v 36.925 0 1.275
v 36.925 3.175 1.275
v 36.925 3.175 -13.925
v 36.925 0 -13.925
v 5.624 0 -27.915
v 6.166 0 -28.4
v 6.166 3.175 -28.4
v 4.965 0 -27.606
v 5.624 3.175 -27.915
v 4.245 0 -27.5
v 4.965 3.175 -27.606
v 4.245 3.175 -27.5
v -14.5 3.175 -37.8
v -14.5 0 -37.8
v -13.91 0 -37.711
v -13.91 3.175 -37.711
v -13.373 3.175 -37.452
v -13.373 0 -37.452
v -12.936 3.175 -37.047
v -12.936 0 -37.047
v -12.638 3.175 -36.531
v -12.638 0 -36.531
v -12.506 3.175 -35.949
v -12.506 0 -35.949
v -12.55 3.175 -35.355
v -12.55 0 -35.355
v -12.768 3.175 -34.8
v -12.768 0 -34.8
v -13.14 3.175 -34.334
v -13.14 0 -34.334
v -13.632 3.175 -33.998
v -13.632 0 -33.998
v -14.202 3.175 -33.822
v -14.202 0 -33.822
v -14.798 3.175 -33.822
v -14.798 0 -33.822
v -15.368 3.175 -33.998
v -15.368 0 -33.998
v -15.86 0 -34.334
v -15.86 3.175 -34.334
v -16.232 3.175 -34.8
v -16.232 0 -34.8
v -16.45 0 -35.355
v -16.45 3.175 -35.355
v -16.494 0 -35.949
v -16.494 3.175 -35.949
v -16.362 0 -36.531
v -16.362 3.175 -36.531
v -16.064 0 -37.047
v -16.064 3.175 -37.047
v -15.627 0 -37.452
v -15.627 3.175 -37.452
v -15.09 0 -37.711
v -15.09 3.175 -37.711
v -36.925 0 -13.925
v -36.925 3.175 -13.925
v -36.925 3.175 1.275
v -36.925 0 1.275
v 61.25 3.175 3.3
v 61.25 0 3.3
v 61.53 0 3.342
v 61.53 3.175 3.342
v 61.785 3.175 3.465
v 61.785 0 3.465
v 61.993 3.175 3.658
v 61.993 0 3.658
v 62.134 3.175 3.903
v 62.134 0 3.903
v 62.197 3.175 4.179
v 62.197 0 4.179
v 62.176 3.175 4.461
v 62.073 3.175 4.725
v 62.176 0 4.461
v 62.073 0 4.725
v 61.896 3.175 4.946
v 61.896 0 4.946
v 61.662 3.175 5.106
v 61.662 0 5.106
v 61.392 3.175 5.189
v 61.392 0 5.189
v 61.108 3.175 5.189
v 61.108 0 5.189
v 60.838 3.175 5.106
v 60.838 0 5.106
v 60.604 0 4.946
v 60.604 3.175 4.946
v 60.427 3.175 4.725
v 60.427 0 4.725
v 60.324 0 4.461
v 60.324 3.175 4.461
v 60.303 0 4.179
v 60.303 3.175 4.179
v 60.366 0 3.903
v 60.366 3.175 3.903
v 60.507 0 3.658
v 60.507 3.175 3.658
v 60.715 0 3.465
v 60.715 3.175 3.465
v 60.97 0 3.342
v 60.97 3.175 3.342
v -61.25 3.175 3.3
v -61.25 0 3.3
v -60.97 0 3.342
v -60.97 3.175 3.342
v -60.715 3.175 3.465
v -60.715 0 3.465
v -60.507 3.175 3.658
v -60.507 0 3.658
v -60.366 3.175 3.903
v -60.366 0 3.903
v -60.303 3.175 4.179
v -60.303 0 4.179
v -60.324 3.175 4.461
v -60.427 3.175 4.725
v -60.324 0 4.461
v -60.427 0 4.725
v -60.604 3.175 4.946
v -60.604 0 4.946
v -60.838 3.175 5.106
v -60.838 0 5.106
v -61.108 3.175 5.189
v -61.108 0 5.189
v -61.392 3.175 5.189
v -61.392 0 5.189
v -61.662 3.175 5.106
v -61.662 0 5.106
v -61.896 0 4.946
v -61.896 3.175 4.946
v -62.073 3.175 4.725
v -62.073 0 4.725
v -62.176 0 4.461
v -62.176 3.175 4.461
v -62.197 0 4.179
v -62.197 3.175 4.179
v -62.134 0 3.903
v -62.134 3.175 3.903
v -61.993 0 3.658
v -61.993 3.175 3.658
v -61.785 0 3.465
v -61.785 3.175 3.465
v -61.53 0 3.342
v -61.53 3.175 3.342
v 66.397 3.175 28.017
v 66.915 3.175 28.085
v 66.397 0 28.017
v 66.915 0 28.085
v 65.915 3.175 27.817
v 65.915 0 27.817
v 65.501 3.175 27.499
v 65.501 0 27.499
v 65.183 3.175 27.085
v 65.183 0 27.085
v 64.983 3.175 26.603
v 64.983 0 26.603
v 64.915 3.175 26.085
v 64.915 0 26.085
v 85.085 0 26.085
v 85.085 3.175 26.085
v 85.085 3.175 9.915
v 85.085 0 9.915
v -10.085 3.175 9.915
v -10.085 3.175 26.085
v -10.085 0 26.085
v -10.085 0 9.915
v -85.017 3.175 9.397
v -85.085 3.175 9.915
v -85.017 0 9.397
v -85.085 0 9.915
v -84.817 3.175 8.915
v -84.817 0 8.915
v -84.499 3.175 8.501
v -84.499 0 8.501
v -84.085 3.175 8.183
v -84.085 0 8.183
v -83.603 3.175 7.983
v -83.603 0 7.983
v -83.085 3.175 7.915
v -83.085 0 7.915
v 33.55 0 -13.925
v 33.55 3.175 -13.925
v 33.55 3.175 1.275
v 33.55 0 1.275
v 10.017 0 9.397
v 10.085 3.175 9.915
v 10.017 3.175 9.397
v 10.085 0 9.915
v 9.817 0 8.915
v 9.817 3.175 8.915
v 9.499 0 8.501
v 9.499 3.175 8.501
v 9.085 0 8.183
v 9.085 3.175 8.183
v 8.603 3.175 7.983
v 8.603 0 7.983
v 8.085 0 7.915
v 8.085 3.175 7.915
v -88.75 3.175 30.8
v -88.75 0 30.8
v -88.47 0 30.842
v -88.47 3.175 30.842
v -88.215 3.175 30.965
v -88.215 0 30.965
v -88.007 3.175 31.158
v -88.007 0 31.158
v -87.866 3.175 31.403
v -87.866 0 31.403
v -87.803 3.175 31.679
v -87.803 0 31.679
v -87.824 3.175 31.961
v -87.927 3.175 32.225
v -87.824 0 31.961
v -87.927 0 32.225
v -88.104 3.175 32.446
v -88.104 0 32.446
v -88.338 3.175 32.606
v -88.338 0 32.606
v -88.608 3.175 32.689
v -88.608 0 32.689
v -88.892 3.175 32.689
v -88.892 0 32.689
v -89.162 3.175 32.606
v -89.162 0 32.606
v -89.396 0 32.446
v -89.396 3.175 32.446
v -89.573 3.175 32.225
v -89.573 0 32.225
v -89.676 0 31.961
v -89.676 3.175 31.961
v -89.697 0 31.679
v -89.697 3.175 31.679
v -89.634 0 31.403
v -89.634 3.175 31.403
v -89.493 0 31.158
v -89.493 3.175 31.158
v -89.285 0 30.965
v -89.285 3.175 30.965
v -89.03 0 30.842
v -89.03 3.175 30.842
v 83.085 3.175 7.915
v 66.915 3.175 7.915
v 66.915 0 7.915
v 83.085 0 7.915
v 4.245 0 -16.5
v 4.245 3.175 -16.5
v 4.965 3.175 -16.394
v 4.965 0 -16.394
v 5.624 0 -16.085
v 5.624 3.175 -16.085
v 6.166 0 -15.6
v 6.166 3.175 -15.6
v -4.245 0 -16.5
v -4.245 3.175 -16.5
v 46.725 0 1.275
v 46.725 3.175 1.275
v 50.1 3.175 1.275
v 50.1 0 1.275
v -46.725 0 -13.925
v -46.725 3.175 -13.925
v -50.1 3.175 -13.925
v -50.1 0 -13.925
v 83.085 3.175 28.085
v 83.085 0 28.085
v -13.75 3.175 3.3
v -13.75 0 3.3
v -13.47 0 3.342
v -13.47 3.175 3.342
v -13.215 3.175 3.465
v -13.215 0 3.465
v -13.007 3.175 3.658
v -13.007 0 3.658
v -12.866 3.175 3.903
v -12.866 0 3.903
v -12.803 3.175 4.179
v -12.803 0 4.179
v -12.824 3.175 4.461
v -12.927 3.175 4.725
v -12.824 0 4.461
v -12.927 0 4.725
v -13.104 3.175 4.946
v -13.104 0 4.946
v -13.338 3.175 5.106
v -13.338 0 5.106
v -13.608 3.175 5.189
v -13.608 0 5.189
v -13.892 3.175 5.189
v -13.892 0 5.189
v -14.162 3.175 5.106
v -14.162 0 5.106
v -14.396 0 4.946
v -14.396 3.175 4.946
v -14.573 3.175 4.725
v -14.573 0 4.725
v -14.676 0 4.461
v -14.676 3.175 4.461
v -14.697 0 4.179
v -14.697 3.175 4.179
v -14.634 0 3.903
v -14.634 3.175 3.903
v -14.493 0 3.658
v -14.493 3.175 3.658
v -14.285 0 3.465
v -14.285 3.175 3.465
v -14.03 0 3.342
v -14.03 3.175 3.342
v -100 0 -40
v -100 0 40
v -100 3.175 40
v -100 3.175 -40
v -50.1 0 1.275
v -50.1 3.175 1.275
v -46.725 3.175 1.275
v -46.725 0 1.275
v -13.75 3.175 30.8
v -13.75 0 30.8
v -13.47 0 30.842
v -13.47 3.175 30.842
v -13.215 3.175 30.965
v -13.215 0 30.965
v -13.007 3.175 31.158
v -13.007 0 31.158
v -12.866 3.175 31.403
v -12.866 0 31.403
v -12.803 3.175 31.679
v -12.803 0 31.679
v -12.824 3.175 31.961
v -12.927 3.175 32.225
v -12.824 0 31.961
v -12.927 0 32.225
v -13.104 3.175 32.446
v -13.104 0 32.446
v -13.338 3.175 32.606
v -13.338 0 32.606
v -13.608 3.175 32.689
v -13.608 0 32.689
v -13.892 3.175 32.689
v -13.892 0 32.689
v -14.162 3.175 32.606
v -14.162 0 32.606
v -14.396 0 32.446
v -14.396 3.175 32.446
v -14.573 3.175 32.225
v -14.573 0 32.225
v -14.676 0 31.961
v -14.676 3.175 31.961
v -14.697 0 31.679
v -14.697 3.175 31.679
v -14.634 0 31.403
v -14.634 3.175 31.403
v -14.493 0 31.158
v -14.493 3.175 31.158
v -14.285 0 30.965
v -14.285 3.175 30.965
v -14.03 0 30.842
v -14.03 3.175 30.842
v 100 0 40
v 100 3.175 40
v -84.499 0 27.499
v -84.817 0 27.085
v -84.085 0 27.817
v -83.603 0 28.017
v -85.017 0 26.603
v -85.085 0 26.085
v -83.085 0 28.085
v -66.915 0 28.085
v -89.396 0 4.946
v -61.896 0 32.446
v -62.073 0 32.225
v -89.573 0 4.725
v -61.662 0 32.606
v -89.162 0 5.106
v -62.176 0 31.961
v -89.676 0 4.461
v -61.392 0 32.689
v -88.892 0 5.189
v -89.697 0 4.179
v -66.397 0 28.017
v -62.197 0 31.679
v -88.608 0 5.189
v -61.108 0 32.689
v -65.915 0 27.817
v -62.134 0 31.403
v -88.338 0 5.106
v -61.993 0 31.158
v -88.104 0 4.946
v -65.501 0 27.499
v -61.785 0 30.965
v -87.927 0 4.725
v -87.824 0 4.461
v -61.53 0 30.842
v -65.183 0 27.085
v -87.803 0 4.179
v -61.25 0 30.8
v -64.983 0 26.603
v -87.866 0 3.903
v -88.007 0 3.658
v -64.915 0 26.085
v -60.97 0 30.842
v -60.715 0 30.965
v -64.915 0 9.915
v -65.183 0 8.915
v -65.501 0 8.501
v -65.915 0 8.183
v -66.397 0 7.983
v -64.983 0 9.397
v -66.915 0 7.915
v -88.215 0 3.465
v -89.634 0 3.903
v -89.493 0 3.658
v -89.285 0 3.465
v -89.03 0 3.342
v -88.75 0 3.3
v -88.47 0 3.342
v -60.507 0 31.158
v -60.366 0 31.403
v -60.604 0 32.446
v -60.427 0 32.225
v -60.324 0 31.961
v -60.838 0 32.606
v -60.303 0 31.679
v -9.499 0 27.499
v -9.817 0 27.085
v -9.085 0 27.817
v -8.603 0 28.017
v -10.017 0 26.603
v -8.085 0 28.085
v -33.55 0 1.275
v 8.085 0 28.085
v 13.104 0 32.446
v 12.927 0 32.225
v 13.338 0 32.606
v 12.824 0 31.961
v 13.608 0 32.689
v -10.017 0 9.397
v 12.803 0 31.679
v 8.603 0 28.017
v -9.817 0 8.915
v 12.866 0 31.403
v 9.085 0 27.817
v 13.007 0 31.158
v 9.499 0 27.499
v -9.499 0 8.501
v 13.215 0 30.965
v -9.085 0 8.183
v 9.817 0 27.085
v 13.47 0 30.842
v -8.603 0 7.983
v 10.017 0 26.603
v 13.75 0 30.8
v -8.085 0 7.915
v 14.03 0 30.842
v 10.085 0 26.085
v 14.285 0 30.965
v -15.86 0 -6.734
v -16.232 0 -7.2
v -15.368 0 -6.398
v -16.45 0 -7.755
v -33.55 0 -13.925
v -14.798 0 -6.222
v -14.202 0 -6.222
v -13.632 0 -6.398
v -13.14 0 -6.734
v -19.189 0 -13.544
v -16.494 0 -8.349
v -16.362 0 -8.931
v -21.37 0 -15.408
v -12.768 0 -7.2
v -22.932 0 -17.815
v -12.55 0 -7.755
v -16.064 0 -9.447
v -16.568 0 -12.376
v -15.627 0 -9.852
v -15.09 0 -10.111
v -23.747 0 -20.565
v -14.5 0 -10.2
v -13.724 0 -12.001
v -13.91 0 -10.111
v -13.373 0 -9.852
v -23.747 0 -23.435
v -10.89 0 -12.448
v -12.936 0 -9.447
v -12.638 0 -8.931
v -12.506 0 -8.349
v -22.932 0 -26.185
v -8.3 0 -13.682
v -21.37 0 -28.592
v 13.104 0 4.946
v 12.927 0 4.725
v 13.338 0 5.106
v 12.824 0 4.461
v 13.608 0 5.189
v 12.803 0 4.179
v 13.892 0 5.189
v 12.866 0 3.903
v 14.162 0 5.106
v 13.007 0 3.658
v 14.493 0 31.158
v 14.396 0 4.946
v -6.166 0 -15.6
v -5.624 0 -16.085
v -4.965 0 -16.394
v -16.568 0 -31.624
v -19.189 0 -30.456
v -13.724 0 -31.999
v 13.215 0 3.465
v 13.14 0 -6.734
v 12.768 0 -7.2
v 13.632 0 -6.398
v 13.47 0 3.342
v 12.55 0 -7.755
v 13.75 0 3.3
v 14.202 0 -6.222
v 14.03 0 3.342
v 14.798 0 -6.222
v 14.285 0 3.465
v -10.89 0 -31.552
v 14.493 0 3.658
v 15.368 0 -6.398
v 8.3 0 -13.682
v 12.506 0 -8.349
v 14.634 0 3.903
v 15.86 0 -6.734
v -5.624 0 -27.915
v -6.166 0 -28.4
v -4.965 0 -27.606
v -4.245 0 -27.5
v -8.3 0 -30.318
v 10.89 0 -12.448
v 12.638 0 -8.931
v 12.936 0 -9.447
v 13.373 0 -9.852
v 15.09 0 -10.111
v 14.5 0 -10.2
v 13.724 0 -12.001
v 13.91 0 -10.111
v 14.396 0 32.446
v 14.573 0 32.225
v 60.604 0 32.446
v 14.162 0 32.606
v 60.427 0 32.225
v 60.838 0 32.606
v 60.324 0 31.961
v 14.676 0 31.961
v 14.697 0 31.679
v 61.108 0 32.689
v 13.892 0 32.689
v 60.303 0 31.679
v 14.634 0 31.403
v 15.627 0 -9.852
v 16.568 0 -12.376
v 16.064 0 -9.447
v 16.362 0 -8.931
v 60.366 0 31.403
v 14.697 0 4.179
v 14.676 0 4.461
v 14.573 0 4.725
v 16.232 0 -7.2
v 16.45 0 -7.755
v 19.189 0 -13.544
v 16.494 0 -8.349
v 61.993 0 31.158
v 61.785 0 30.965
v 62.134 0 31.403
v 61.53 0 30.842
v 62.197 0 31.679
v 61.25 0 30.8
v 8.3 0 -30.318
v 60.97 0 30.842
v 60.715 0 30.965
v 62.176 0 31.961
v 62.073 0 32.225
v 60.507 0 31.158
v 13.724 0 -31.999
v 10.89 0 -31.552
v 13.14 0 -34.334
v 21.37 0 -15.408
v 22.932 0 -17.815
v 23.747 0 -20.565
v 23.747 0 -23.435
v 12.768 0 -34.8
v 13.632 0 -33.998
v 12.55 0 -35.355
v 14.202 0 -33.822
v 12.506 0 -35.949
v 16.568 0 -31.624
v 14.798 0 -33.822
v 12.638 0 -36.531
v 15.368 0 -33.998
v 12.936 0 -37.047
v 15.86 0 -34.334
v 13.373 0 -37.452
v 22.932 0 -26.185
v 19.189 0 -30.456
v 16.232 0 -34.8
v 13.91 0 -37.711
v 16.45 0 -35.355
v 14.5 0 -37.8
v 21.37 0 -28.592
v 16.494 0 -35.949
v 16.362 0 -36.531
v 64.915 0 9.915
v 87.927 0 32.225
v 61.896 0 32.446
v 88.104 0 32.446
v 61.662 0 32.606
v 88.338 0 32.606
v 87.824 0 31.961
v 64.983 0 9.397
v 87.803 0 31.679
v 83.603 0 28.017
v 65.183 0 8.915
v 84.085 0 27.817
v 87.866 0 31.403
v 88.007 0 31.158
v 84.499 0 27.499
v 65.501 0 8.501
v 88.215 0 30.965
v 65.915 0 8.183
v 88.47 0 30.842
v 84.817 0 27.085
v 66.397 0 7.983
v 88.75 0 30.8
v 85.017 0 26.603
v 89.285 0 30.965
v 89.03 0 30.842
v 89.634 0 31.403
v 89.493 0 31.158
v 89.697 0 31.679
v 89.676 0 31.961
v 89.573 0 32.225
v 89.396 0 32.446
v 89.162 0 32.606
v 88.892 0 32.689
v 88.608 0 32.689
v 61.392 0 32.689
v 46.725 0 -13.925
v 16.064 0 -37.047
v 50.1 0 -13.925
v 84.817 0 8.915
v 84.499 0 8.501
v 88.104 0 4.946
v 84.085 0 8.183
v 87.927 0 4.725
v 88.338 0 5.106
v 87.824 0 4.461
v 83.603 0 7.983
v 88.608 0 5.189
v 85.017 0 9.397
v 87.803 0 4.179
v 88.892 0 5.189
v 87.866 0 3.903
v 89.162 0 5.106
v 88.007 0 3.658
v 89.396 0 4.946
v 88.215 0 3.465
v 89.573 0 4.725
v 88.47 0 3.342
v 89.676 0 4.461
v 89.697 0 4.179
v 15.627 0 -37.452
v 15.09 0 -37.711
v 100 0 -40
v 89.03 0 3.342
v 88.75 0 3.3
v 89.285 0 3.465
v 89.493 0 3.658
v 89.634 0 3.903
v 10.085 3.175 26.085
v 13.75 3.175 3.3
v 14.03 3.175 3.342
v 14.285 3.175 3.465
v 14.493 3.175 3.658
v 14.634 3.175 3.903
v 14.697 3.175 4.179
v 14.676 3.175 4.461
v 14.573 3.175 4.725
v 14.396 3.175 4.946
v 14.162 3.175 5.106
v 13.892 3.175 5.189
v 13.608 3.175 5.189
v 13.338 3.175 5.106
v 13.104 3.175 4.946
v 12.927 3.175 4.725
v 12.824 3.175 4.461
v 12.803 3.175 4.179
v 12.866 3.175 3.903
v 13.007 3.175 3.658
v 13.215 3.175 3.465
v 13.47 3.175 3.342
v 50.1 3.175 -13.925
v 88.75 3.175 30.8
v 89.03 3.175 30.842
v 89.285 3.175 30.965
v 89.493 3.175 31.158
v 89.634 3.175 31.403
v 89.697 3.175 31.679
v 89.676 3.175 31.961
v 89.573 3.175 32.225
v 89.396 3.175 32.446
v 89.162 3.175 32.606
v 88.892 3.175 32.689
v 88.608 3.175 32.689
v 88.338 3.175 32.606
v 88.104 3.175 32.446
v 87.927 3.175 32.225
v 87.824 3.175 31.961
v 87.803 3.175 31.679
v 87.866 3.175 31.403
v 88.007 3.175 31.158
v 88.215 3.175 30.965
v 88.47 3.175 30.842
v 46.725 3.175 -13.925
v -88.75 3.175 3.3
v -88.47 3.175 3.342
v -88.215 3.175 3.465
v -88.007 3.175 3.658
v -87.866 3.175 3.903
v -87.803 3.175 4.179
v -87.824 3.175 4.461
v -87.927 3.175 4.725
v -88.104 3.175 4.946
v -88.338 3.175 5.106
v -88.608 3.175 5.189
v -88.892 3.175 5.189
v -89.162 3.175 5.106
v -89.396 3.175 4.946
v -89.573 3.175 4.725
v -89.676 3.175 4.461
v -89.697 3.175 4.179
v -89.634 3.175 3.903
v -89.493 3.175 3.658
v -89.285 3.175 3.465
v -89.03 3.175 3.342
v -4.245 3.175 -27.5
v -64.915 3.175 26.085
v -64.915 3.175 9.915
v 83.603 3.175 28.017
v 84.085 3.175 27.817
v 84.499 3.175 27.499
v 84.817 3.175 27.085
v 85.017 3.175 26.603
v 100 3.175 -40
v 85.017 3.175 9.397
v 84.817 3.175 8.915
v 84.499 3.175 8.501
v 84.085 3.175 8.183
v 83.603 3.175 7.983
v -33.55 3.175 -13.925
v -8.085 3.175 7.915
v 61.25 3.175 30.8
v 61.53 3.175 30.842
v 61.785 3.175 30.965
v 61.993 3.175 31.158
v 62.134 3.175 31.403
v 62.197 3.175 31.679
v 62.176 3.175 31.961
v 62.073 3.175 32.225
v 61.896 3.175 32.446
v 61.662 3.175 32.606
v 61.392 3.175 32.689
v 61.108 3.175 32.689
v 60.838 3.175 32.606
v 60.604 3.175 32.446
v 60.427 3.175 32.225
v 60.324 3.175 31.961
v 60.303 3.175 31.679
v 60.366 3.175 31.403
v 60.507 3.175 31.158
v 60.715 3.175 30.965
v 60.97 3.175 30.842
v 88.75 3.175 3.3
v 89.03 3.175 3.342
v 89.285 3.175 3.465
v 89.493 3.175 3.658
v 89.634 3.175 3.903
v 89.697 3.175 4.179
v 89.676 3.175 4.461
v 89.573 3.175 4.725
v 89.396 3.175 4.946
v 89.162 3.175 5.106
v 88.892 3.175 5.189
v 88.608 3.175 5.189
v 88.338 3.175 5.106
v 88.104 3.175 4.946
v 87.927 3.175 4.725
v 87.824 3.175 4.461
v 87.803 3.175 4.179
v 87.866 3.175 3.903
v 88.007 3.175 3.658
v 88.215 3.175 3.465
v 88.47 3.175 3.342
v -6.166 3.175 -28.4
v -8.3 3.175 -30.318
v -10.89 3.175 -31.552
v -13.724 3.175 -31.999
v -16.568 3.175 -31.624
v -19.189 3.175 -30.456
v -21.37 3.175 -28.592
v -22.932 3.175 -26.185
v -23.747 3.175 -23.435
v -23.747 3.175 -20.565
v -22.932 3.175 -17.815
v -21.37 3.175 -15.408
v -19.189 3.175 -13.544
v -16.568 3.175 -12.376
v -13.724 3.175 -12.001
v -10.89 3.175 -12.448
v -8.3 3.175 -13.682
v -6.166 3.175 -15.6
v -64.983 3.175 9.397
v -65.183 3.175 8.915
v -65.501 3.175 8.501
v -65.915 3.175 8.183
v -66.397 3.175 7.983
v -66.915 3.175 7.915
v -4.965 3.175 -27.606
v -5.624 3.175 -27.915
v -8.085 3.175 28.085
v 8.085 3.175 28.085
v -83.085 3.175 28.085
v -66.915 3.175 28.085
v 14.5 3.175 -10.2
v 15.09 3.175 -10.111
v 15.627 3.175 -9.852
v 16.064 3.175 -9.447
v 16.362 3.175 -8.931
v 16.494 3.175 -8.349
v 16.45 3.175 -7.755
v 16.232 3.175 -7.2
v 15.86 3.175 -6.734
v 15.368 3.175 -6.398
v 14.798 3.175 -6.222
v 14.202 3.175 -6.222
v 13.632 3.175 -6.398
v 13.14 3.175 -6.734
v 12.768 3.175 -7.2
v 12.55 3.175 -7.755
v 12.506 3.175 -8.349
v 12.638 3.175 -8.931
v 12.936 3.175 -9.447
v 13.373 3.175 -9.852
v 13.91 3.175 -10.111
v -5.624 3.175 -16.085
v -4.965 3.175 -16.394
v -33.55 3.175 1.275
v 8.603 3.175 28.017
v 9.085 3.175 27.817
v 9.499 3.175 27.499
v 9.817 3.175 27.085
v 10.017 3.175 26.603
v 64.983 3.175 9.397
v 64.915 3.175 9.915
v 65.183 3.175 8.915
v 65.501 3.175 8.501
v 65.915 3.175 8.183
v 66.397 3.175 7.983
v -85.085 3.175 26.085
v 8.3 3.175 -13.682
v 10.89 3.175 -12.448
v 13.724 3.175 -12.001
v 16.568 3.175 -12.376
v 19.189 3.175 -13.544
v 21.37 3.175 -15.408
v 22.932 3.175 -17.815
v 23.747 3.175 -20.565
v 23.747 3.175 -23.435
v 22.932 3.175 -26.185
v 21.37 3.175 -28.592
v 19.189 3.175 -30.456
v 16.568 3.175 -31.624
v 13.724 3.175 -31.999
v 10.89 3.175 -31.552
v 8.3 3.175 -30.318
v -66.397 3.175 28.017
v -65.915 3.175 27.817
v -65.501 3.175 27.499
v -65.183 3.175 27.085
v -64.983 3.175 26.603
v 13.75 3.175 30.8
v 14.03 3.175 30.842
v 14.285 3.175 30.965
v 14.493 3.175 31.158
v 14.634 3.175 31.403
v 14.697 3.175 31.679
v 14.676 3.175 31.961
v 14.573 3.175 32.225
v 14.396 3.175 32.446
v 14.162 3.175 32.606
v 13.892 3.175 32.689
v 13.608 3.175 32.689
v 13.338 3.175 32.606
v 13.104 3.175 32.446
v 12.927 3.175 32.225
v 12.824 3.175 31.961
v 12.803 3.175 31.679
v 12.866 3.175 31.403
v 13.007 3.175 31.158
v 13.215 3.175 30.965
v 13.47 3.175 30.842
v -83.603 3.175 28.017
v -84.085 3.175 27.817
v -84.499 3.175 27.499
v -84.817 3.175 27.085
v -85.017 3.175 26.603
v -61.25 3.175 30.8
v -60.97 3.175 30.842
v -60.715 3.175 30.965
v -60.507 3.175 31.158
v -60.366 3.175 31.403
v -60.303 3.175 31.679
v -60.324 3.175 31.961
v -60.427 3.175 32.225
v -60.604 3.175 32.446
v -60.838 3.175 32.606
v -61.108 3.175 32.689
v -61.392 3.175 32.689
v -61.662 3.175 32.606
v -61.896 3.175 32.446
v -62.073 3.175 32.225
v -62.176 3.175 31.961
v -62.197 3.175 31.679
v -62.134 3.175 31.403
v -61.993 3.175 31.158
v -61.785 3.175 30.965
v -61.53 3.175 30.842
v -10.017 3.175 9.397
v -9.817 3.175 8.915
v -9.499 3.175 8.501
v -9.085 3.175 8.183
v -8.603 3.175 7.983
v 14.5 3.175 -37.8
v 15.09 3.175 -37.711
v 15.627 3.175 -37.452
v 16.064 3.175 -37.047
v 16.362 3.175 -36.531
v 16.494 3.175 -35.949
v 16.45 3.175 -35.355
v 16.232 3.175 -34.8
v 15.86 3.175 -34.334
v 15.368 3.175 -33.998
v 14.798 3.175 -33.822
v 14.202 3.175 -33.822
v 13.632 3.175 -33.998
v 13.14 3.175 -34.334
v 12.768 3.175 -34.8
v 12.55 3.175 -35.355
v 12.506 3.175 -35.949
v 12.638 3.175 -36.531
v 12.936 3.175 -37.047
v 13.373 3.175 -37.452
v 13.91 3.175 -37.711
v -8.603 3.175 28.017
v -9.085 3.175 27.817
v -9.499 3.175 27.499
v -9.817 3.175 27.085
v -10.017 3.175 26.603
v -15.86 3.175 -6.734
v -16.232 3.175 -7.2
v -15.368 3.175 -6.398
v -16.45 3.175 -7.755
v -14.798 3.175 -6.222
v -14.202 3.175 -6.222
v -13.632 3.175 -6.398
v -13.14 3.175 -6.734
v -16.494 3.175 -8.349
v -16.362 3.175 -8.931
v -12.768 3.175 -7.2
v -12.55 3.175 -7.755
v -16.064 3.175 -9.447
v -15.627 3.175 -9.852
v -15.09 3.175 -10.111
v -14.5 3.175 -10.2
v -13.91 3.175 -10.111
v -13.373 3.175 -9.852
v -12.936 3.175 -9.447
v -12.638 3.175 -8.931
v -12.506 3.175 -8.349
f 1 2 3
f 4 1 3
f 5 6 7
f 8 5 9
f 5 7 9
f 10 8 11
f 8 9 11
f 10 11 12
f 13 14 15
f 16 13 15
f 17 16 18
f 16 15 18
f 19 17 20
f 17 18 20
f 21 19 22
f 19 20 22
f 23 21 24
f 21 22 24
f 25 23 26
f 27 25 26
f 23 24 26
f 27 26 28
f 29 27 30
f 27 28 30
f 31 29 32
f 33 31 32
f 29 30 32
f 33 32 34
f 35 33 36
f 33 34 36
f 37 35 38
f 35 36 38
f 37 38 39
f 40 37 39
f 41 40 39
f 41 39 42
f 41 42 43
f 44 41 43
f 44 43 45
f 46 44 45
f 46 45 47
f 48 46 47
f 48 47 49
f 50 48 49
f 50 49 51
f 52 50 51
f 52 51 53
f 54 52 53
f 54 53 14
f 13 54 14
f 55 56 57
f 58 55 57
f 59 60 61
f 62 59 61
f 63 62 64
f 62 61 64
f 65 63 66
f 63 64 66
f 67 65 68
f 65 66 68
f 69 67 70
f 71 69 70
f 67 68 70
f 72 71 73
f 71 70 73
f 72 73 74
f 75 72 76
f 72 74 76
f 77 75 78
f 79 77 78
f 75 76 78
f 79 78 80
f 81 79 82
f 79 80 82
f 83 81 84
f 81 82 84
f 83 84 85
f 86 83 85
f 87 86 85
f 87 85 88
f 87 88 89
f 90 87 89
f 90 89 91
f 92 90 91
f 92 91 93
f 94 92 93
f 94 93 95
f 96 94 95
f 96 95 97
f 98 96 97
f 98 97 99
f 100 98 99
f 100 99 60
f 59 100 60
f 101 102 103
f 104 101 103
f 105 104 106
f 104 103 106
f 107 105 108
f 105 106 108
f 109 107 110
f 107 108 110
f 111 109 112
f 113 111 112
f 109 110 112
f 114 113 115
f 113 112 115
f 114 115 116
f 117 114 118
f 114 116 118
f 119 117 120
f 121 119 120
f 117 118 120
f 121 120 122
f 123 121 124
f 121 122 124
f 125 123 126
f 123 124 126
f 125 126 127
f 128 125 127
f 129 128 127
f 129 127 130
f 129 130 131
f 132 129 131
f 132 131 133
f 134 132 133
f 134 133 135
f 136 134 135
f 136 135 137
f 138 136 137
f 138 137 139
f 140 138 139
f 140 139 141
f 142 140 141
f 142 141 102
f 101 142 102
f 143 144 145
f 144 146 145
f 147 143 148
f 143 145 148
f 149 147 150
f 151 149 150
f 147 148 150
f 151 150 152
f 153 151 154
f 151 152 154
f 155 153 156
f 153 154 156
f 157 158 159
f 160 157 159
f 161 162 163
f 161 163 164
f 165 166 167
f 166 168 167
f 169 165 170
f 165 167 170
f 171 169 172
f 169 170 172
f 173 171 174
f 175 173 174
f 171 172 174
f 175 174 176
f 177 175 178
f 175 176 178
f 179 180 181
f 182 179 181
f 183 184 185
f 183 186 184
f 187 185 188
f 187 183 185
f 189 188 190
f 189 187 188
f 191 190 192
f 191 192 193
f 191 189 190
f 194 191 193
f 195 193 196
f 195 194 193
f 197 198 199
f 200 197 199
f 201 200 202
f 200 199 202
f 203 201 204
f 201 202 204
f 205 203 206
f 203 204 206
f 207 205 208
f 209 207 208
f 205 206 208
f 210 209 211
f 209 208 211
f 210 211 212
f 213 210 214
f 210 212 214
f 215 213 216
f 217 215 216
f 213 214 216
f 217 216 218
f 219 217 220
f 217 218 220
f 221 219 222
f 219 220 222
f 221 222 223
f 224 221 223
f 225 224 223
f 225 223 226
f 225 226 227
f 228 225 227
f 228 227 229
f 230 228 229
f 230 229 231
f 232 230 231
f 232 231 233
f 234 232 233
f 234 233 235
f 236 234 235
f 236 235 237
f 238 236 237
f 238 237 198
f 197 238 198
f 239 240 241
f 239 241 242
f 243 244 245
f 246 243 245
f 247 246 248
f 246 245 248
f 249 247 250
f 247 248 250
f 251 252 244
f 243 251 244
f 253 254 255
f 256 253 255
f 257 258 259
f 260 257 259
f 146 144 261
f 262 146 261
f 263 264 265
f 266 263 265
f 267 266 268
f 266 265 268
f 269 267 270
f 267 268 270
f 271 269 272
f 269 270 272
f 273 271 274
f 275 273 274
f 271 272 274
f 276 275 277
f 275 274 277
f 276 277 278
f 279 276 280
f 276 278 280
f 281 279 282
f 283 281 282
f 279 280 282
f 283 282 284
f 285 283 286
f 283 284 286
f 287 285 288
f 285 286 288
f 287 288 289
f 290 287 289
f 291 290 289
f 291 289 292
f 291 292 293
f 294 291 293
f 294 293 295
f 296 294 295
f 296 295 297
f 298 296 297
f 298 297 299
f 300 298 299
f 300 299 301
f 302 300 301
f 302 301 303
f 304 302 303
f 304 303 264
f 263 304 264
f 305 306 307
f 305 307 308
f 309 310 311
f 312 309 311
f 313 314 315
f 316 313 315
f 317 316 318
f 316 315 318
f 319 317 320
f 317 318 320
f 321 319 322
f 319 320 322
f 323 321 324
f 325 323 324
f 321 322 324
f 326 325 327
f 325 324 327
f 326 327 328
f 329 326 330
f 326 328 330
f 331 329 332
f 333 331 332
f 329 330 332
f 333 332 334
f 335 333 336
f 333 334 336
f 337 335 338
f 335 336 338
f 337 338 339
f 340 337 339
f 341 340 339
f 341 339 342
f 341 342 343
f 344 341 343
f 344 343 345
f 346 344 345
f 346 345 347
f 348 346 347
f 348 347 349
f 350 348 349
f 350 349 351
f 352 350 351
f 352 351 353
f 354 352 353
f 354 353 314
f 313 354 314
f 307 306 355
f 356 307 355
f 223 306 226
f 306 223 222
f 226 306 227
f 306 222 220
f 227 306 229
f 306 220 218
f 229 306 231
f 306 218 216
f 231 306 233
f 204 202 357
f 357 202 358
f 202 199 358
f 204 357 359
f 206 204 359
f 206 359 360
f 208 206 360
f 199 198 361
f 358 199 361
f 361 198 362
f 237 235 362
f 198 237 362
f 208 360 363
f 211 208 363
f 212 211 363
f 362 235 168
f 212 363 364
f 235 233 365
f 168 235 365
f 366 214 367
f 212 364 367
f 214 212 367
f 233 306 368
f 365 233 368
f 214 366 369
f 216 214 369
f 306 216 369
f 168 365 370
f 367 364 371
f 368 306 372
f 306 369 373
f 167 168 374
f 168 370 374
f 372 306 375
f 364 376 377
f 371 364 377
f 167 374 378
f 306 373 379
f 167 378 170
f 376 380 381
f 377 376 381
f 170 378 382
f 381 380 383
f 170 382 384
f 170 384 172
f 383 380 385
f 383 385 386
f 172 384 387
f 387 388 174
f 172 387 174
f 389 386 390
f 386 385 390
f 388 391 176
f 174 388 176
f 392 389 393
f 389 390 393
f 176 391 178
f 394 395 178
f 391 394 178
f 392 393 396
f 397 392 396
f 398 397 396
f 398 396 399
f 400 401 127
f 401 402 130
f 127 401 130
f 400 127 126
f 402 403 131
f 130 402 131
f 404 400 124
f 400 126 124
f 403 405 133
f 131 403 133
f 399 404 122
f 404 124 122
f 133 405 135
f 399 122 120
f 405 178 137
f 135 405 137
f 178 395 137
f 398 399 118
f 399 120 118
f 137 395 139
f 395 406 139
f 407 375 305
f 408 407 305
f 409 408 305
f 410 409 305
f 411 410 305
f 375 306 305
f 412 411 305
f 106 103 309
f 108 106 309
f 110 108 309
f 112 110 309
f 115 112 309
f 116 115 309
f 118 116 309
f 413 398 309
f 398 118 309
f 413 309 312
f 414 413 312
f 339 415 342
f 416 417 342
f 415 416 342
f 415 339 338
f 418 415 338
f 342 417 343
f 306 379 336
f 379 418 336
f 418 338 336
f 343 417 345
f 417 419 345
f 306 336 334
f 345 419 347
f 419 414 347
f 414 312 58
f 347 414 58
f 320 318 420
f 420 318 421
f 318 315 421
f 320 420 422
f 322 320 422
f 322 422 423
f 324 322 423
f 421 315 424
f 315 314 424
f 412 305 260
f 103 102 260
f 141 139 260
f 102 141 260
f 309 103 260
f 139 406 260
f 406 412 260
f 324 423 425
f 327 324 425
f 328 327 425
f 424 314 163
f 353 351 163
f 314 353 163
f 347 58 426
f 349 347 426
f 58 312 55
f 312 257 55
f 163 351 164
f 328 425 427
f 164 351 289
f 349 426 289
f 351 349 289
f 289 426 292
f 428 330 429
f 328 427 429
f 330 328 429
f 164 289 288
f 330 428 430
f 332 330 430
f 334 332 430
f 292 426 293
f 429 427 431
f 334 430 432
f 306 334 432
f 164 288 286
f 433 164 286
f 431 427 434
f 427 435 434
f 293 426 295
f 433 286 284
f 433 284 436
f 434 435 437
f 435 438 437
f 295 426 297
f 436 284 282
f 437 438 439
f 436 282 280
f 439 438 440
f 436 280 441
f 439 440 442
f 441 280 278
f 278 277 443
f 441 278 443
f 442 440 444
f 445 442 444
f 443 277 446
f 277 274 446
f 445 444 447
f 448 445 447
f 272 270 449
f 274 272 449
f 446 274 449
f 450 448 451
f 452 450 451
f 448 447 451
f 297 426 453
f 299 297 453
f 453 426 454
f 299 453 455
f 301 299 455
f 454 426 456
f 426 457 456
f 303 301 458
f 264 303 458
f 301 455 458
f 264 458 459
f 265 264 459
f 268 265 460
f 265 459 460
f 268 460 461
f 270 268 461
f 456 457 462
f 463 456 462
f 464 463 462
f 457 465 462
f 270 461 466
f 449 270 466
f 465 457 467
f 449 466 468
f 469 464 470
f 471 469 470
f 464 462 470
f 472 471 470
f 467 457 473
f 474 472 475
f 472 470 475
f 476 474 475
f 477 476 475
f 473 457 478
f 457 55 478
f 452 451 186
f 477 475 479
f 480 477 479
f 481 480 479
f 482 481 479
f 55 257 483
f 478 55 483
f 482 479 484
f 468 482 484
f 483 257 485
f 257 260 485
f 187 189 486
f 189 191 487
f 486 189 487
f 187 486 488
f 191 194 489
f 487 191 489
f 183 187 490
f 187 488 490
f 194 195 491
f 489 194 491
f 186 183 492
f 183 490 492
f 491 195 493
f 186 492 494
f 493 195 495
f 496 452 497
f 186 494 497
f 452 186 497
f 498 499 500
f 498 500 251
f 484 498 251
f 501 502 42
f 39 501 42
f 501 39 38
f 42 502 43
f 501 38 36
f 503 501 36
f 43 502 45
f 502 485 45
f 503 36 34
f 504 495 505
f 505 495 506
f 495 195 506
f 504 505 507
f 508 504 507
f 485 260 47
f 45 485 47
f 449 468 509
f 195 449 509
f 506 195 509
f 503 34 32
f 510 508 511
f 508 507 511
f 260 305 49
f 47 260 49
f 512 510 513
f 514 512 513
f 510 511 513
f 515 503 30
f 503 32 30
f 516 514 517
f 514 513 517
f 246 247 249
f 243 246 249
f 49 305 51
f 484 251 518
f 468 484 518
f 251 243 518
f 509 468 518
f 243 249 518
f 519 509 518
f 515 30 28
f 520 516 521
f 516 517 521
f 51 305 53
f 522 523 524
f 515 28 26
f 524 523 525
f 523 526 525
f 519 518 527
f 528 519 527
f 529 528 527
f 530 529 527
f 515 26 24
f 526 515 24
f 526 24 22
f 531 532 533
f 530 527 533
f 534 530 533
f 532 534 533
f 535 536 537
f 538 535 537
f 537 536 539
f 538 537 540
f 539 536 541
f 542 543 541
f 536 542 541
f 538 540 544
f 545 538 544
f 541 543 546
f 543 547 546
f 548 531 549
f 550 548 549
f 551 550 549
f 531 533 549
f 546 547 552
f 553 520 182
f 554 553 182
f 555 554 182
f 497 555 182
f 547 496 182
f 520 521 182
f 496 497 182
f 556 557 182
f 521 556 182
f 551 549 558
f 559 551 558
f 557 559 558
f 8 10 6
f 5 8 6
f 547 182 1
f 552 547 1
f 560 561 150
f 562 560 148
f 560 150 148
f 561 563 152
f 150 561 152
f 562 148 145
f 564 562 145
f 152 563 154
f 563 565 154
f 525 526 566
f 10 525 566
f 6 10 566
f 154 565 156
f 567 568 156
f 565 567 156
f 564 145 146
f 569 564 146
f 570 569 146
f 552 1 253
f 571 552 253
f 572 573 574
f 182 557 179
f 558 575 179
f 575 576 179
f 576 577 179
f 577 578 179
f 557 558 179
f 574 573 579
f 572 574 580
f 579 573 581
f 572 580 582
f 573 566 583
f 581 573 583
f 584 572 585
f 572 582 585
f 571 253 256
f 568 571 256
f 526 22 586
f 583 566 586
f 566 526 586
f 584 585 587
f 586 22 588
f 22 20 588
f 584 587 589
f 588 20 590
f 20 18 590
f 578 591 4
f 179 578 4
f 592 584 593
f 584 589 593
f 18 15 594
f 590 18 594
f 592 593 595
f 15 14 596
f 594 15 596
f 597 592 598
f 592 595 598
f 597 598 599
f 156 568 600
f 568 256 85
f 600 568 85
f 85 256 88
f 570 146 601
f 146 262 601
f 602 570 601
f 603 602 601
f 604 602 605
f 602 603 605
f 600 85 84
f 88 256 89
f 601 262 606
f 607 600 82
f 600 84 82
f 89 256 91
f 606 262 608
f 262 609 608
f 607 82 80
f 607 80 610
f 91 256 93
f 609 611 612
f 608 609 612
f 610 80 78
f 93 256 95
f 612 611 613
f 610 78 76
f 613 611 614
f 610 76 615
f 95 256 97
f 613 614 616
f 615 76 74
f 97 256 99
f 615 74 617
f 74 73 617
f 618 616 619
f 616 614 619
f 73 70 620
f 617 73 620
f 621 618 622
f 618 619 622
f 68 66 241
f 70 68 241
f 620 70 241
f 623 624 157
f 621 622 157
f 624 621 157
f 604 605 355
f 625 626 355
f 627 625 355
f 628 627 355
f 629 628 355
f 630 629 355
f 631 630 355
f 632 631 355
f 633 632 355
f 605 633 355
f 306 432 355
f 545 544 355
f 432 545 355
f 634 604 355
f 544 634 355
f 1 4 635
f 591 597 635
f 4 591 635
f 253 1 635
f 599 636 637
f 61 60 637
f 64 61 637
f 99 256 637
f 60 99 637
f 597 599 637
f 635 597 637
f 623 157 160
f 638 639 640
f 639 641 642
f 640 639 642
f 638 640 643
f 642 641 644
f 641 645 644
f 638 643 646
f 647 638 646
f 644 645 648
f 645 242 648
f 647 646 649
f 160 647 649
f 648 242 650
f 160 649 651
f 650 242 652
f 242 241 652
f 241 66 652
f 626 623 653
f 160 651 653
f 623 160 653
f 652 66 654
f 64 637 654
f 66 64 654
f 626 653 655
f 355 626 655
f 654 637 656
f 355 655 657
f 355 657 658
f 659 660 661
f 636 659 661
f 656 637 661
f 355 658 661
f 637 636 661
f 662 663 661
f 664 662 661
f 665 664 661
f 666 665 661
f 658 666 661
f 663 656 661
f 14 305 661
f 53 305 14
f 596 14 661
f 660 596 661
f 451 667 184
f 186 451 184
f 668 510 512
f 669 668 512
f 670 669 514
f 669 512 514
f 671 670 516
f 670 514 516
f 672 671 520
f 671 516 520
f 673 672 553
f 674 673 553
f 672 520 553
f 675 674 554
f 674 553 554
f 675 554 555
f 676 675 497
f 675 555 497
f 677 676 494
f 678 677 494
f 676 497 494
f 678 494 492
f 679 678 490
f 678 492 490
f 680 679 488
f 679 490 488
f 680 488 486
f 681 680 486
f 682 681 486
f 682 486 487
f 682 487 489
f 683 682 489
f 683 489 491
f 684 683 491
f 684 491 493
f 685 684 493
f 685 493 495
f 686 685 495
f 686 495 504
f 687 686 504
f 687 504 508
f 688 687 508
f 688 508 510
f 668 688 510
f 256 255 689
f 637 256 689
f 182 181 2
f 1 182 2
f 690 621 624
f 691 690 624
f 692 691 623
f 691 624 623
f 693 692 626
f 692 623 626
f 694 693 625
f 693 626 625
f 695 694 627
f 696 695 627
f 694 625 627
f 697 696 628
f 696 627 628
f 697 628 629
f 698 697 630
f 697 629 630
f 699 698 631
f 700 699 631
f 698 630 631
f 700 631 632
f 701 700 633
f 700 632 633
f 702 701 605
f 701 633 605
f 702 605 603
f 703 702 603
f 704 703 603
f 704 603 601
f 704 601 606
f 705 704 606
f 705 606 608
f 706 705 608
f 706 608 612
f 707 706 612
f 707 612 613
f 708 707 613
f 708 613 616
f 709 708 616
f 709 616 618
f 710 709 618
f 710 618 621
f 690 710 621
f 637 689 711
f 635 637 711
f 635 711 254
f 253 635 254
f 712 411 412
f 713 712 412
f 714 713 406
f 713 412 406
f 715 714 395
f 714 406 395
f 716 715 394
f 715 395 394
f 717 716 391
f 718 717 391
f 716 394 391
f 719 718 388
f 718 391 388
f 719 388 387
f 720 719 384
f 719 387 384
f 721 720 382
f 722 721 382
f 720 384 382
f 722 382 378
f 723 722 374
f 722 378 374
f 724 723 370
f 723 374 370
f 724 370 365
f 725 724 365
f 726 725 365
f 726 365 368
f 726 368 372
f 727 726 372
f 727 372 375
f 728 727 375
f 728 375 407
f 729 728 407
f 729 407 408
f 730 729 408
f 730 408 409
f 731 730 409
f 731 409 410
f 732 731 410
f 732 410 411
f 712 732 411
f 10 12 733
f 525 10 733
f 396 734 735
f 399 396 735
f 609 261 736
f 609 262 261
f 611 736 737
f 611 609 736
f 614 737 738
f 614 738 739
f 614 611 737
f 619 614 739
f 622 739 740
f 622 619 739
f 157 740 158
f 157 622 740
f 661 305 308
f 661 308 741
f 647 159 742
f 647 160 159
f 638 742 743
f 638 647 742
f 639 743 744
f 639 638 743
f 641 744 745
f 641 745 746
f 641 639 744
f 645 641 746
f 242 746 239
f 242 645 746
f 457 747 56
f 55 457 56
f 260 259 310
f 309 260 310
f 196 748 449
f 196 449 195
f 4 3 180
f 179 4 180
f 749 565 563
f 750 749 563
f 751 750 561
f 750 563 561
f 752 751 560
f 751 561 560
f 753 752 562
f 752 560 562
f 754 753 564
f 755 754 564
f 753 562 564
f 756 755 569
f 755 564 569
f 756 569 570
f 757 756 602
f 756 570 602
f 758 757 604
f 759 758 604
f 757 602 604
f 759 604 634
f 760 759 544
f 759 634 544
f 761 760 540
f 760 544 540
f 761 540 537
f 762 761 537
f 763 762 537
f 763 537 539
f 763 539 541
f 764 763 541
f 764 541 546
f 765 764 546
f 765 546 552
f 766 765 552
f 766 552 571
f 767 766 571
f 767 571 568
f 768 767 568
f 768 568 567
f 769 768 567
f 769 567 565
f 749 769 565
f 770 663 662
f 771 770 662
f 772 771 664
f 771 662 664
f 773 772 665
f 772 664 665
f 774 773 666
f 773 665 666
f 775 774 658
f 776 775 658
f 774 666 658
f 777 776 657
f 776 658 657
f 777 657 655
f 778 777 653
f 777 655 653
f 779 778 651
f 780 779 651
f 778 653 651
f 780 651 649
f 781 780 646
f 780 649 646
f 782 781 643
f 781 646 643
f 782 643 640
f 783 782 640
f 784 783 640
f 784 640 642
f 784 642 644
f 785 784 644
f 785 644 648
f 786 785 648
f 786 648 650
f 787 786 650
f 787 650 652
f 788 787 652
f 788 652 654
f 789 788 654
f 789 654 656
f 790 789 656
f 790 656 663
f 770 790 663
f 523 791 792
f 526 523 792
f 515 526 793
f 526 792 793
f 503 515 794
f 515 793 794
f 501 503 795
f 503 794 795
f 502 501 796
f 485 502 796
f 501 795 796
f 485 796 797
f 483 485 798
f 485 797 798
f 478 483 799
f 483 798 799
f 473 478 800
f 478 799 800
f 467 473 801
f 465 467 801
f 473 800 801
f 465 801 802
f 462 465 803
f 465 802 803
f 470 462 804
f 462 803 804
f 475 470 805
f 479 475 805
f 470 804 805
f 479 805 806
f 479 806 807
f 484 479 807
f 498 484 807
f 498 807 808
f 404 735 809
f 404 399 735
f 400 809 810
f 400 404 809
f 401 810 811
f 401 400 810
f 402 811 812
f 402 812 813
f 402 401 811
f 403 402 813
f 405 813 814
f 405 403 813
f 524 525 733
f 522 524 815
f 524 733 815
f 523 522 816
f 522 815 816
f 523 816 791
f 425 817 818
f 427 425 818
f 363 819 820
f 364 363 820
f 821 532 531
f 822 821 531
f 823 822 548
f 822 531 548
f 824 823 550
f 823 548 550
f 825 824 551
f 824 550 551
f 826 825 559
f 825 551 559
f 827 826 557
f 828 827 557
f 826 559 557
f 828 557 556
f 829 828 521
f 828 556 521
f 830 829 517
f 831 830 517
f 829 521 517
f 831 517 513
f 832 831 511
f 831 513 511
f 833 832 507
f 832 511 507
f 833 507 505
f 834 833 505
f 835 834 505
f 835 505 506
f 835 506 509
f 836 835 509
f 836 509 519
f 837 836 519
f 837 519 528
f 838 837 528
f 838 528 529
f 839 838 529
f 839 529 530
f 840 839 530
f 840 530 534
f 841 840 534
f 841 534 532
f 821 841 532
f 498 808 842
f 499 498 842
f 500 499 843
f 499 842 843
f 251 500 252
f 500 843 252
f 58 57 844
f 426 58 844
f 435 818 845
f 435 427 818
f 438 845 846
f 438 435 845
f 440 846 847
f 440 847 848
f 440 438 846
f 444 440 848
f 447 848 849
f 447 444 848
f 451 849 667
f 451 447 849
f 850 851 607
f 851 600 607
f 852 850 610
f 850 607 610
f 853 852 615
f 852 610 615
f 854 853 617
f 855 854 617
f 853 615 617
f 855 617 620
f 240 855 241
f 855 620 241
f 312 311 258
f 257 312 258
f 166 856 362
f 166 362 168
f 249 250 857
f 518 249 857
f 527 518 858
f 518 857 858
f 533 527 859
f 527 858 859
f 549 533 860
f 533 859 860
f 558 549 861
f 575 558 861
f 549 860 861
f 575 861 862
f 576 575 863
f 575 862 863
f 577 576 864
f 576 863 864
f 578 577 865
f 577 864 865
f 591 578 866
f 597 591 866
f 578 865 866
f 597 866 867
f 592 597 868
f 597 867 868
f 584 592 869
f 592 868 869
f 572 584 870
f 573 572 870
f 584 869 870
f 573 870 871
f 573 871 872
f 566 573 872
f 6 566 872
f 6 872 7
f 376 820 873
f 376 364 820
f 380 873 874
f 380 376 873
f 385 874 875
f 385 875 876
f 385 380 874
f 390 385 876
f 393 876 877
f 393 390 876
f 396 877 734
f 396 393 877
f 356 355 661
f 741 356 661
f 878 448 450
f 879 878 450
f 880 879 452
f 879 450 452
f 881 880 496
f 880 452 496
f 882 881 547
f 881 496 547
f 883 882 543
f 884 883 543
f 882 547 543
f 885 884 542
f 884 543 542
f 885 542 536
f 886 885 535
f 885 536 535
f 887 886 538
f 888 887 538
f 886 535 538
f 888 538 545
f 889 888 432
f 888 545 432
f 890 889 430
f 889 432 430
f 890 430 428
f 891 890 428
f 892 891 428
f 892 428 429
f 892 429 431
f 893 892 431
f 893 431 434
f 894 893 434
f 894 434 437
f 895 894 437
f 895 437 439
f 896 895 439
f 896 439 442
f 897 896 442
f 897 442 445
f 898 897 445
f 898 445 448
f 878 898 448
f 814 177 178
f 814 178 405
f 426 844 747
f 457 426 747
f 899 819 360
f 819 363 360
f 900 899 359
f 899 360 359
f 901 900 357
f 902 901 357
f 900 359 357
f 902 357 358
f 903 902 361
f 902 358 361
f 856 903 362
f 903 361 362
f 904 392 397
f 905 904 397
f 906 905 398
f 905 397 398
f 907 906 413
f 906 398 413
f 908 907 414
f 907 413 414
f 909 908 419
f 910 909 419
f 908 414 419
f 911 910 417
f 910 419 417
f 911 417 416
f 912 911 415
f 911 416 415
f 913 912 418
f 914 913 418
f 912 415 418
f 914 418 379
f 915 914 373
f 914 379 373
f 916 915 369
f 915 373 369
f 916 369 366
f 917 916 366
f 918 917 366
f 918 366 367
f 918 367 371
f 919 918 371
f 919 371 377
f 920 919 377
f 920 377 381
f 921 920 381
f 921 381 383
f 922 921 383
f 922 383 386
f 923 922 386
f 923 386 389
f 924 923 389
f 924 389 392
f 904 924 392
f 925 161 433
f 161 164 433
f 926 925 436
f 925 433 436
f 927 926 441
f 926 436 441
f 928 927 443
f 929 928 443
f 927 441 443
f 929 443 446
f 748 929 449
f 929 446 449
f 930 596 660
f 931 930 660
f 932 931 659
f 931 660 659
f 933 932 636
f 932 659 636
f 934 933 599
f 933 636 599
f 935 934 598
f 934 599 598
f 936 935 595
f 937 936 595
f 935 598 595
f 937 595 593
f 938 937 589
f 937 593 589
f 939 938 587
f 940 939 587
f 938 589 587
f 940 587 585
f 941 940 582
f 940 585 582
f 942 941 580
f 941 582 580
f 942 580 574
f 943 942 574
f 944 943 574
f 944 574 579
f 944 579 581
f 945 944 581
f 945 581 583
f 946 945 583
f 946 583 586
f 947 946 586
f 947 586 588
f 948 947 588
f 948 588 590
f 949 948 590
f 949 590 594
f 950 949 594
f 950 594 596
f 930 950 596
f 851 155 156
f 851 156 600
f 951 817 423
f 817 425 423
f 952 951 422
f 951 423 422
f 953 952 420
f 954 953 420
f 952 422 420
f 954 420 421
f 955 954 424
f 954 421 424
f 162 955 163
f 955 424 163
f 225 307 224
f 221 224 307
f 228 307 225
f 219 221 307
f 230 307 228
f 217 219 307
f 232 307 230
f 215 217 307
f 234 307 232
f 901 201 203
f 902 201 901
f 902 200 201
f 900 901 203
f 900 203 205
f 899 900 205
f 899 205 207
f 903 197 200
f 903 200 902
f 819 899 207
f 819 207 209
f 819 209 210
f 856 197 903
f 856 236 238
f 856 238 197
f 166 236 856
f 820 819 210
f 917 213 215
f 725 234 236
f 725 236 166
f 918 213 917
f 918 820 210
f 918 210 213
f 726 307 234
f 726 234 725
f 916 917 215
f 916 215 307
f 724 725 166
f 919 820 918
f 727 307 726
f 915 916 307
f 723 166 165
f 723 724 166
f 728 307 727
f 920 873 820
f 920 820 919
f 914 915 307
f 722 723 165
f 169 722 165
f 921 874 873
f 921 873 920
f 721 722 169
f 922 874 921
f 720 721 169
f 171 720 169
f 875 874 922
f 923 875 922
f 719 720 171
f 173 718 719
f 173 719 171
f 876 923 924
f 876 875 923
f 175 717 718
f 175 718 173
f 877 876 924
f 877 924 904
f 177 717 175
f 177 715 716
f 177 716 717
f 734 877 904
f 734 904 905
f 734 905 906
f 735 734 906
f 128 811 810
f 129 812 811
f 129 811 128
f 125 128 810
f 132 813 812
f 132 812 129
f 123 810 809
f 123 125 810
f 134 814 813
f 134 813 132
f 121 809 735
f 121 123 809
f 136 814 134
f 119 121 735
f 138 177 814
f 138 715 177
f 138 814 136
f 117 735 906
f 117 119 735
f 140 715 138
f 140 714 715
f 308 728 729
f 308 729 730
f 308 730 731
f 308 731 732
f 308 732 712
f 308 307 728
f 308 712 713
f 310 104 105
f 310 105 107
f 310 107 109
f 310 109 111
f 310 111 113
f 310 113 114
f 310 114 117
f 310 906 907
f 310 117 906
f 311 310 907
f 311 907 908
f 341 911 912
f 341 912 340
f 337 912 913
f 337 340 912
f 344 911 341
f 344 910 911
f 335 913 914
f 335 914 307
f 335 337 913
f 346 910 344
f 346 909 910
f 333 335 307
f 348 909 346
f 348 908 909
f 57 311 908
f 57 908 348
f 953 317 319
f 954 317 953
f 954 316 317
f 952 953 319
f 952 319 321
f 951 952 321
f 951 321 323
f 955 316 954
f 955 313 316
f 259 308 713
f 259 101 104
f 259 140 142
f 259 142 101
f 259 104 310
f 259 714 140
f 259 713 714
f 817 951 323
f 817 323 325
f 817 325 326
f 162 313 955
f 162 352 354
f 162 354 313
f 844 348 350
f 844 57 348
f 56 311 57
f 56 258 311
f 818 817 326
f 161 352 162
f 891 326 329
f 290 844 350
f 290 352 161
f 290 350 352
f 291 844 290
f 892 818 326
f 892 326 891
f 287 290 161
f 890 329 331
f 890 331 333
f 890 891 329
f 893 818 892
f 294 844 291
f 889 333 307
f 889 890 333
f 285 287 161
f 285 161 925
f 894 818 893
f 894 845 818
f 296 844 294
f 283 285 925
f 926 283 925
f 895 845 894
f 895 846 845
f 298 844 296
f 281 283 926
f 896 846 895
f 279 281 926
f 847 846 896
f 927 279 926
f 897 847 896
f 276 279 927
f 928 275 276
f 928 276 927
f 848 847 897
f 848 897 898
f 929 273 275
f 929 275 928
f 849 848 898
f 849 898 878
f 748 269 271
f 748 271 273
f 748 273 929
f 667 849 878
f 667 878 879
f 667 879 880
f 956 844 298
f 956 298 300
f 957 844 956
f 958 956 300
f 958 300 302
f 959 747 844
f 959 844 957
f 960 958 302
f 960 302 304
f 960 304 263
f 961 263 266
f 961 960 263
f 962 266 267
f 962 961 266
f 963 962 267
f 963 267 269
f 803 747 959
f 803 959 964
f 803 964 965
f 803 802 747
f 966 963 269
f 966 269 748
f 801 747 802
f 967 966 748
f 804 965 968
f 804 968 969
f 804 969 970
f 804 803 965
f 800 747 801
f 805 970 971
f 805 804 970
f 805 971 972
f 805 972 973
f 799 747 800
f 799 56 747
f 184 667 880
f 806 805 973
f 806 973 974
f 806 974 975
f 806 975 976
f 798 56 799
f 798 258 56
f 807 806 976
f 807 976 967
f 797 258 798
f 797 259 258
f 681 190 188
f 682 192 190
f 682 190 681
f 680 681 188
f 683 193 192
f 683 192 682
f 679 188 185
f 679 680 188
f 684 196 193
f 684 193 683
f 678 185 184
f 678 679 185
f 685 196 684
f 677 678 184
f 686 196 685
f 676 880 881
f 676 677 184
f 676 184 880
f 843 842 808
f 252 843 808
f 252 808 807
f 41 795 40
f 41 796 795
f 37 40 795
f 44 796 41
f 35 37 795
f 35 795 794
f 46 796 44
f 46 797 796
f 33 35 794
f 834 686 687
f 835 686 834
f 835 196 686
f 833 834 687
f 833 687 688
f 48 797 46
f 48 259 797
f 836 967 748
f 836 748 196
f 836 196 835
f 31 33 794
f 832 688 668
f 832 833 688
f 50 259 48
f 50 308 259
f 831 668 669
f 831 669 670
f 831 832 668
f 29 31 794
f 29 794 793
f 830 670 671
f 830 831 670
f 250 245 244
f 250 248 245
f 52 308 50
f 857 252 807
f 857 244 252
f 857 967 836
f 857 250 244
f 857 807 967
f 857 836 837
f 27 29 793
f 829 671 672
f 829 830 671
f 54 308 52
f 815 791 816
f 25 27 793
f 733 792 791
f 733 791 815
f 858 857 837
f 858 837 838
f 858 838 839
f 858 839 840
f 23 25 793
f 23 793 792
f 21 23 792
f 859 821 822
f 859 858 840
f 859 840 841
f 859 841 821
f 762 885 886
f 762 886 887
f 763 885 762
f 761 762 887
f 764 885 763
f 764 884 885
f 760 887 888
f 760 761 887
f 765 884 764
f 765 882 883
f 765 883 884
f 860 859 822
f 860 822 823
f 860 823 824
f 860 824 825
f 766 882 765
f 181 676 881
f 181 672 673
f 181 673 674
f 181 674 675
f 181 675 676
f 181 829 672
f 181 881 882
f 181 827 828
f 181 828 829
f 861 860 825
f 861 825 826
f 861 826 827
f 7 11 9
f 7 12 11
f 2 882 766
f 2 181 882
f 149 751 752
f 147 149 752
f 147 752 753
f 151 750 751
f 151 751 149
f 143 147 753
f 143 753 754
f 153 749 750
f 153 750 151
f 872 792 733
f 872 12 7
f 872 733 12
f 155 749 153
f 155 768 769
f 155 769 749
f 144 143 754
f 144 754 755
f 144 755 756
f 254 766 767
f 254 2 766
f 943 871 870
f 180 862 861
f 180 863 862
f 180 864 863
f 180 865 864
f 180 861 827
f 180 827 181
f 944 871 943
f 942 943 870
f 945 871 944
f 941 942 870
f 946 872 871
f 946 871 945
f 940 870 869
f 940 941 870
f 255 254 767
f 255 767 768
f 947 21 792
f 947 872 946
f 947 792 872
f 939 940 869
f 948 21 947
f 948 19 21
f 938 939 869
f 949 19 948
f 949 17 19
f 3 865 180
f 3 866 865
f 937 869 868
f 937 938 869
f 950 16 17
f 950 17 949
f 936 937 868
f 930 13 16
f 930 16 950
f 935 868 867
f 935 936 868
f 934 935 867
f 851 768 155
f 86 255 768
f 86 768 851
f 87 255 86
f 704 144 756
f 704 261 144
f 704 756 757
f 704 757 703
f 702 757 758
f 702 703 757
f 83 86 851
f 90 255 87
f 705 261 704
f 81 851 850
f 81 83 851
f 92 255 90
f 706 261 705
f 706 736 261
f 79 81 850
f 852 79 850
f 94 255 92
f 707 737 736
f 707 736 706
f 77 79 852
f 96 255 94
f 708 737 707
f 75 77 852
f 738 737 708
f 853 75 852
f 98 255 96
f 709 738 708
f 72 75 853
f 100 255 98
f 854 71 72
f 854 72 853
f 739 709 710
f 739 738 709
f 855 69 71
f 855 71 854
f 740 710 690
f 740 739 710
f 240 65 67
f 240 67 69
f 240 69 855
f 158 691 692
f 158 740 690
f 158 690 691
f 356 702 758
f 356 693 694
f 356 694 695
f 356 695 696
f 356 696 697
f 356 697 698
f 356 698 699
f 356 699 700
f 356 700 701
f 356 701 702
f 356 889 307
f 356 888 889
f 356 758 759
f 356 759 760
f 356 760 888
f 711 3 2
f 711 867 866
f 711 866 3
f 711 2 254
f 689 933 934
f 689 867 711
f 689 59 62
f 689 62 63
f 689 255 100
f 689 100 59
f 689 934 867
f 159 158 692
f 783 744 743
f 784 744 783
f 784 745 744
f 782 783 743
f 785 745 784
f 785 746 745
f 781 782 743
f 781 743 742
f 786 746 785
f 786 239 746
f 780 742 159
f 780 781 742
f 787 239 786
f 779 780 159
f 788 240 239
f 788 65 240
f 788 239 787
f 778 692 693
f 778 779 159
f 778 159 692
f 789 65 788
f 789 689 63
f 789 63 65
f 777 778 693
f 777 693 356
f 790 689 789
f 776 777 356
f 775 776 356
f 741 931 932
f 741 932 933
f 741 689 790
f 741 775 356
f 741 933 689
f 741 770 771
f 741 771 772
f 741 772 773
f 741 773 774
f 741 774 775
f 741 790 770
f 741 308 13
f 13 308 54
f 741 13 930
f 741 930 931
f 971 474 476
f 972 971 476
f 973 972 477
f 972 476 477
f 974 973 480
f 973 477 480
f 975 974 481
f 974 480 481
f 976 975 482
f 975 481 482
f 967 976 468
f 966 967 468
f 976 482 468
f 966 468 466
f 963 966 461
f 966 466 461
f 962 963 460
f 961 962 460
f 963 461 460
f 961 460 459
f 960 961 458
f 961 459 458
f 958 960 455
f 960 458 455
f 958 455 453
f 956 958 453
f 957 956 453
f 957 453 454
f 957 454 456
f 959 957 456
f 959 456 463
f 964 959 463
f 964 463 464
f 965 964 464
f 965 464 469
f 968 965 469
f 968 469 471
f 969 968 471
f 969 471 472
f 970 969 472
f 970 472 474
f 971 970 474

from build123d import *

# Parameters (mm, degrees)
SKETCH1_W           = 200
SKETCH1_H           = 80
BOSS_EXTRUDE1_DEPTH = 3.175
SKETCH3_W           = 20.17
SKETCH3_H           = 20.17
CUT_EXTRUDE2_DEPTH  = 108.750084107
SKETCH5_R           = 2
CUT_EXTRUDE3_DEPTH  = 108.750084107
SKETCH6_R           = 0.95
CUT_EXTRUDE4_DEPTH  = 108.750084107
CUT_EXTRUDE5_DEPTH  = 108.750084107
FILLET1_R           = 2


with BuildPart() as part:
    # Sketch1 → Boss-Extrude1 (new body)
    with BuildSketch(Plane(origin=(0, 0, 0), x_dir=(1, 0, 0), z_dir=(0, 1, 0))):
        Rectangle(SKETCH1_W, SKETCH1_H)
    extrude(amount=BOSS_EXTRUDE1_DEPTH)

    # Sketch3 → Cut-Extrude2 (cut, through all)
    with BuildSketch(Plane(origin=(0, 3.175, 0), x_dir=(1, 0, 0), z_dir=(0, 1, 0))):
        with Locations((75, -18)):
            Rectangle(SKETCH3_W, SKETCH3_H)
        with Locations((-75, -18)):
            Rectangle(SKETCH3_W, SKETCH3_H)
        with Locations((0, -18)):
            Rectangle(SKETCH3_W, SKETCH3_H)
        with BuildLine():
            Line((4.245313644, 27.5), (-4.245313644, 27.5))
            ThreePointArc((-4.245313644, 27.5), (-5.305973816, 27.736153715), (-6.166250915, 28.4))
            ThreePointArc((-6.166250915, 28.4), (-23.85, 22), (-6.166250915, 15.6))
            ThreePointArc((-6.166250915, 15.6), (-5.305973816, 16.263846285), (-4.245313644, 16.5))
            Line((-4.245313644, 16.5), (4.245313644, 16.5))
            ThreePointArc((4.245313644, 16.5), (5.305973816, 16.263846285), (6.166250915, 15.6))
            ThreePointArc((6.166250915, 15.6), (23.85, 22), (6.166250915, 28.4))
            ThreePointArc((6.166250915, 28.4), (5.305973816, 27.736153715), (4.245313644, 27.5))
        make_face()
    extrude(amount=-CUT_EXTRUDE2_DEPTH, mode=Mode.SUBTRACT)

    # Sketch5 → Cut-Extrude3 (cut, through all)
    with BuildSketch(Plane.XZ):
        with Locations(Location((14.5, -8.2, 0), (0, 0, 270))):
            Circle(SKETCH5_R)
        with Locations(Location((-14.5, -8.2, 0), (0, 0, 270))):
            Circle(SKETCH5_R)
        with Locations(Location((14.5, -35.8, 0), (0, 0, 270))):
            Circle(SKETCH5_R)
        with Locations(Location((-14.5, -35.8, 0), (0, 0, 270))):
            Circle(SKETCH5_R)
    extrude(amount=-CUT_EXTRUDE3_DEPTH, mode=Mode.SUBTRACT)

    # Sketch6 → Cut-Extrude4 (cut, through all)
    with BuildSketch(Plane.XZ):
        with Locations(Location((-61.25, 4.25, 0), (0, 0, 270))):
            Circle(SKETCH6_R)
        with Locations(Location((13.75, 4.25, 0), (0, 0, 270))):
            Circle(SKETCH6_R)
        with Locations(Location((-88.75, 4.25, 0), (0, 0, 270))):
            Circle(SKETCH6_R)
        with Locations(Location((-61.25, 31.75, 0), (0, 0, 270))):
            Circle(SKETCH6_R)
        with Locations(Location((-13.75, 4.25, 0), (0, 0, 270))):
            Circle(SKETCH6_R)
        with Locations(Location((-13.75, 31.75, 0), (0, 0, 270))):
            Circle(SKETCH6_R)
        with Locations(Location((13.75, 31.75, 0), (0, 0, 270))):
            Circle(SKETCH6_R)
        with Locations(Location((88.75, 31.75, 0), (0, 0, 270))):
            Circle(SKETCH6_R)
        with Locations(Location((61.25, 31.75, 0), (0, 0, 270))):
            Circle(SKETCH6_R)
        with Locations(Location((61.25, 4.25, 0), (0, 0, 270))):
            Circle(SKETCH6_R)
        with Locations(Location((88.75, 4.25, 0), (0, 0, 270))):
            Circle(SKETCH6_R)
        with Locations(Location((-88.75, 31.75, 0), (0, 0, 270))):
            Circle(SKETCH6_R)
    extrude(amount=-CUT_EXTRUDE4_DEPTH, mode=Mode.SUBTRACT)

    # Sketch7 → Cut-Extrude5 (cut, through all)
    with BuildSketch(Plane(origin=(0, 3.175, 0), x_dir=(1, 0, 0), z_dir=(0, 1, 0))):
        Polygon((-50.1, 13.925), (-50.1, 12.825), (-50.1, -0.175), (-50.1, -1.275), (-46.725, -1.275), (-46.725, -0.175), (-46.725, 12.825), (-46.725, 13.925), align=None)
        Polygon((-36.925, -0.175), (-36.925, -1.275), (-33.55, -1.275), (-33.55, -0.175), (-33.55, 12.825), (-33.55, 13.925), (-36.925, 13.925), (-36.925, 12.825), align=None)
        Polygon((33.55, 13.925), (33.55, 12.825), (33.55, -0.175), (33.55, -1.275), (36.925, -1.275), (36.925, -0.175), (36.925, 12.825), (36.925, 13.925), align=None)
        Polygon((46.725, -0.175), (46.725, -1.275), (50.1, -1.275), (50.1, -0.175), (50.1, 12.825), (50.1, 13.925), (46.725, 13.925), (46.725, 12.825), align=None)
    extrude(amount=-CUT_EXTRUDE5_DEPTH, mode=Mode.SUBTRACT)

    # Fillet1
    fillet1_edges = [part.edges().sort_by_distance(p)[0] for p in [
        (85.085, 1.5875, 7.915),
        (85.085, 1.5875, 28.085),
        (64.915, 1.5875, 28.085),
        (64.915, 1.5875, 7.915),
        (-64.915, 1.5875, 7.915),
        (-64.915, 1.5875, 28.085),
        (-85.085, 1.5875, 28.085),
        (-85.085, 1.5875, 7.915),
        (10.085, 1.5875, 7.915),
        (10.085, 1.5875, 28.085),
        (-10.085, 1.5875, 28.085),
        (-10.085, 1.5875, 7.915),
    ]]
    fillet(fillet1_edges, radius=FILLET1_R)


solid = part.part
